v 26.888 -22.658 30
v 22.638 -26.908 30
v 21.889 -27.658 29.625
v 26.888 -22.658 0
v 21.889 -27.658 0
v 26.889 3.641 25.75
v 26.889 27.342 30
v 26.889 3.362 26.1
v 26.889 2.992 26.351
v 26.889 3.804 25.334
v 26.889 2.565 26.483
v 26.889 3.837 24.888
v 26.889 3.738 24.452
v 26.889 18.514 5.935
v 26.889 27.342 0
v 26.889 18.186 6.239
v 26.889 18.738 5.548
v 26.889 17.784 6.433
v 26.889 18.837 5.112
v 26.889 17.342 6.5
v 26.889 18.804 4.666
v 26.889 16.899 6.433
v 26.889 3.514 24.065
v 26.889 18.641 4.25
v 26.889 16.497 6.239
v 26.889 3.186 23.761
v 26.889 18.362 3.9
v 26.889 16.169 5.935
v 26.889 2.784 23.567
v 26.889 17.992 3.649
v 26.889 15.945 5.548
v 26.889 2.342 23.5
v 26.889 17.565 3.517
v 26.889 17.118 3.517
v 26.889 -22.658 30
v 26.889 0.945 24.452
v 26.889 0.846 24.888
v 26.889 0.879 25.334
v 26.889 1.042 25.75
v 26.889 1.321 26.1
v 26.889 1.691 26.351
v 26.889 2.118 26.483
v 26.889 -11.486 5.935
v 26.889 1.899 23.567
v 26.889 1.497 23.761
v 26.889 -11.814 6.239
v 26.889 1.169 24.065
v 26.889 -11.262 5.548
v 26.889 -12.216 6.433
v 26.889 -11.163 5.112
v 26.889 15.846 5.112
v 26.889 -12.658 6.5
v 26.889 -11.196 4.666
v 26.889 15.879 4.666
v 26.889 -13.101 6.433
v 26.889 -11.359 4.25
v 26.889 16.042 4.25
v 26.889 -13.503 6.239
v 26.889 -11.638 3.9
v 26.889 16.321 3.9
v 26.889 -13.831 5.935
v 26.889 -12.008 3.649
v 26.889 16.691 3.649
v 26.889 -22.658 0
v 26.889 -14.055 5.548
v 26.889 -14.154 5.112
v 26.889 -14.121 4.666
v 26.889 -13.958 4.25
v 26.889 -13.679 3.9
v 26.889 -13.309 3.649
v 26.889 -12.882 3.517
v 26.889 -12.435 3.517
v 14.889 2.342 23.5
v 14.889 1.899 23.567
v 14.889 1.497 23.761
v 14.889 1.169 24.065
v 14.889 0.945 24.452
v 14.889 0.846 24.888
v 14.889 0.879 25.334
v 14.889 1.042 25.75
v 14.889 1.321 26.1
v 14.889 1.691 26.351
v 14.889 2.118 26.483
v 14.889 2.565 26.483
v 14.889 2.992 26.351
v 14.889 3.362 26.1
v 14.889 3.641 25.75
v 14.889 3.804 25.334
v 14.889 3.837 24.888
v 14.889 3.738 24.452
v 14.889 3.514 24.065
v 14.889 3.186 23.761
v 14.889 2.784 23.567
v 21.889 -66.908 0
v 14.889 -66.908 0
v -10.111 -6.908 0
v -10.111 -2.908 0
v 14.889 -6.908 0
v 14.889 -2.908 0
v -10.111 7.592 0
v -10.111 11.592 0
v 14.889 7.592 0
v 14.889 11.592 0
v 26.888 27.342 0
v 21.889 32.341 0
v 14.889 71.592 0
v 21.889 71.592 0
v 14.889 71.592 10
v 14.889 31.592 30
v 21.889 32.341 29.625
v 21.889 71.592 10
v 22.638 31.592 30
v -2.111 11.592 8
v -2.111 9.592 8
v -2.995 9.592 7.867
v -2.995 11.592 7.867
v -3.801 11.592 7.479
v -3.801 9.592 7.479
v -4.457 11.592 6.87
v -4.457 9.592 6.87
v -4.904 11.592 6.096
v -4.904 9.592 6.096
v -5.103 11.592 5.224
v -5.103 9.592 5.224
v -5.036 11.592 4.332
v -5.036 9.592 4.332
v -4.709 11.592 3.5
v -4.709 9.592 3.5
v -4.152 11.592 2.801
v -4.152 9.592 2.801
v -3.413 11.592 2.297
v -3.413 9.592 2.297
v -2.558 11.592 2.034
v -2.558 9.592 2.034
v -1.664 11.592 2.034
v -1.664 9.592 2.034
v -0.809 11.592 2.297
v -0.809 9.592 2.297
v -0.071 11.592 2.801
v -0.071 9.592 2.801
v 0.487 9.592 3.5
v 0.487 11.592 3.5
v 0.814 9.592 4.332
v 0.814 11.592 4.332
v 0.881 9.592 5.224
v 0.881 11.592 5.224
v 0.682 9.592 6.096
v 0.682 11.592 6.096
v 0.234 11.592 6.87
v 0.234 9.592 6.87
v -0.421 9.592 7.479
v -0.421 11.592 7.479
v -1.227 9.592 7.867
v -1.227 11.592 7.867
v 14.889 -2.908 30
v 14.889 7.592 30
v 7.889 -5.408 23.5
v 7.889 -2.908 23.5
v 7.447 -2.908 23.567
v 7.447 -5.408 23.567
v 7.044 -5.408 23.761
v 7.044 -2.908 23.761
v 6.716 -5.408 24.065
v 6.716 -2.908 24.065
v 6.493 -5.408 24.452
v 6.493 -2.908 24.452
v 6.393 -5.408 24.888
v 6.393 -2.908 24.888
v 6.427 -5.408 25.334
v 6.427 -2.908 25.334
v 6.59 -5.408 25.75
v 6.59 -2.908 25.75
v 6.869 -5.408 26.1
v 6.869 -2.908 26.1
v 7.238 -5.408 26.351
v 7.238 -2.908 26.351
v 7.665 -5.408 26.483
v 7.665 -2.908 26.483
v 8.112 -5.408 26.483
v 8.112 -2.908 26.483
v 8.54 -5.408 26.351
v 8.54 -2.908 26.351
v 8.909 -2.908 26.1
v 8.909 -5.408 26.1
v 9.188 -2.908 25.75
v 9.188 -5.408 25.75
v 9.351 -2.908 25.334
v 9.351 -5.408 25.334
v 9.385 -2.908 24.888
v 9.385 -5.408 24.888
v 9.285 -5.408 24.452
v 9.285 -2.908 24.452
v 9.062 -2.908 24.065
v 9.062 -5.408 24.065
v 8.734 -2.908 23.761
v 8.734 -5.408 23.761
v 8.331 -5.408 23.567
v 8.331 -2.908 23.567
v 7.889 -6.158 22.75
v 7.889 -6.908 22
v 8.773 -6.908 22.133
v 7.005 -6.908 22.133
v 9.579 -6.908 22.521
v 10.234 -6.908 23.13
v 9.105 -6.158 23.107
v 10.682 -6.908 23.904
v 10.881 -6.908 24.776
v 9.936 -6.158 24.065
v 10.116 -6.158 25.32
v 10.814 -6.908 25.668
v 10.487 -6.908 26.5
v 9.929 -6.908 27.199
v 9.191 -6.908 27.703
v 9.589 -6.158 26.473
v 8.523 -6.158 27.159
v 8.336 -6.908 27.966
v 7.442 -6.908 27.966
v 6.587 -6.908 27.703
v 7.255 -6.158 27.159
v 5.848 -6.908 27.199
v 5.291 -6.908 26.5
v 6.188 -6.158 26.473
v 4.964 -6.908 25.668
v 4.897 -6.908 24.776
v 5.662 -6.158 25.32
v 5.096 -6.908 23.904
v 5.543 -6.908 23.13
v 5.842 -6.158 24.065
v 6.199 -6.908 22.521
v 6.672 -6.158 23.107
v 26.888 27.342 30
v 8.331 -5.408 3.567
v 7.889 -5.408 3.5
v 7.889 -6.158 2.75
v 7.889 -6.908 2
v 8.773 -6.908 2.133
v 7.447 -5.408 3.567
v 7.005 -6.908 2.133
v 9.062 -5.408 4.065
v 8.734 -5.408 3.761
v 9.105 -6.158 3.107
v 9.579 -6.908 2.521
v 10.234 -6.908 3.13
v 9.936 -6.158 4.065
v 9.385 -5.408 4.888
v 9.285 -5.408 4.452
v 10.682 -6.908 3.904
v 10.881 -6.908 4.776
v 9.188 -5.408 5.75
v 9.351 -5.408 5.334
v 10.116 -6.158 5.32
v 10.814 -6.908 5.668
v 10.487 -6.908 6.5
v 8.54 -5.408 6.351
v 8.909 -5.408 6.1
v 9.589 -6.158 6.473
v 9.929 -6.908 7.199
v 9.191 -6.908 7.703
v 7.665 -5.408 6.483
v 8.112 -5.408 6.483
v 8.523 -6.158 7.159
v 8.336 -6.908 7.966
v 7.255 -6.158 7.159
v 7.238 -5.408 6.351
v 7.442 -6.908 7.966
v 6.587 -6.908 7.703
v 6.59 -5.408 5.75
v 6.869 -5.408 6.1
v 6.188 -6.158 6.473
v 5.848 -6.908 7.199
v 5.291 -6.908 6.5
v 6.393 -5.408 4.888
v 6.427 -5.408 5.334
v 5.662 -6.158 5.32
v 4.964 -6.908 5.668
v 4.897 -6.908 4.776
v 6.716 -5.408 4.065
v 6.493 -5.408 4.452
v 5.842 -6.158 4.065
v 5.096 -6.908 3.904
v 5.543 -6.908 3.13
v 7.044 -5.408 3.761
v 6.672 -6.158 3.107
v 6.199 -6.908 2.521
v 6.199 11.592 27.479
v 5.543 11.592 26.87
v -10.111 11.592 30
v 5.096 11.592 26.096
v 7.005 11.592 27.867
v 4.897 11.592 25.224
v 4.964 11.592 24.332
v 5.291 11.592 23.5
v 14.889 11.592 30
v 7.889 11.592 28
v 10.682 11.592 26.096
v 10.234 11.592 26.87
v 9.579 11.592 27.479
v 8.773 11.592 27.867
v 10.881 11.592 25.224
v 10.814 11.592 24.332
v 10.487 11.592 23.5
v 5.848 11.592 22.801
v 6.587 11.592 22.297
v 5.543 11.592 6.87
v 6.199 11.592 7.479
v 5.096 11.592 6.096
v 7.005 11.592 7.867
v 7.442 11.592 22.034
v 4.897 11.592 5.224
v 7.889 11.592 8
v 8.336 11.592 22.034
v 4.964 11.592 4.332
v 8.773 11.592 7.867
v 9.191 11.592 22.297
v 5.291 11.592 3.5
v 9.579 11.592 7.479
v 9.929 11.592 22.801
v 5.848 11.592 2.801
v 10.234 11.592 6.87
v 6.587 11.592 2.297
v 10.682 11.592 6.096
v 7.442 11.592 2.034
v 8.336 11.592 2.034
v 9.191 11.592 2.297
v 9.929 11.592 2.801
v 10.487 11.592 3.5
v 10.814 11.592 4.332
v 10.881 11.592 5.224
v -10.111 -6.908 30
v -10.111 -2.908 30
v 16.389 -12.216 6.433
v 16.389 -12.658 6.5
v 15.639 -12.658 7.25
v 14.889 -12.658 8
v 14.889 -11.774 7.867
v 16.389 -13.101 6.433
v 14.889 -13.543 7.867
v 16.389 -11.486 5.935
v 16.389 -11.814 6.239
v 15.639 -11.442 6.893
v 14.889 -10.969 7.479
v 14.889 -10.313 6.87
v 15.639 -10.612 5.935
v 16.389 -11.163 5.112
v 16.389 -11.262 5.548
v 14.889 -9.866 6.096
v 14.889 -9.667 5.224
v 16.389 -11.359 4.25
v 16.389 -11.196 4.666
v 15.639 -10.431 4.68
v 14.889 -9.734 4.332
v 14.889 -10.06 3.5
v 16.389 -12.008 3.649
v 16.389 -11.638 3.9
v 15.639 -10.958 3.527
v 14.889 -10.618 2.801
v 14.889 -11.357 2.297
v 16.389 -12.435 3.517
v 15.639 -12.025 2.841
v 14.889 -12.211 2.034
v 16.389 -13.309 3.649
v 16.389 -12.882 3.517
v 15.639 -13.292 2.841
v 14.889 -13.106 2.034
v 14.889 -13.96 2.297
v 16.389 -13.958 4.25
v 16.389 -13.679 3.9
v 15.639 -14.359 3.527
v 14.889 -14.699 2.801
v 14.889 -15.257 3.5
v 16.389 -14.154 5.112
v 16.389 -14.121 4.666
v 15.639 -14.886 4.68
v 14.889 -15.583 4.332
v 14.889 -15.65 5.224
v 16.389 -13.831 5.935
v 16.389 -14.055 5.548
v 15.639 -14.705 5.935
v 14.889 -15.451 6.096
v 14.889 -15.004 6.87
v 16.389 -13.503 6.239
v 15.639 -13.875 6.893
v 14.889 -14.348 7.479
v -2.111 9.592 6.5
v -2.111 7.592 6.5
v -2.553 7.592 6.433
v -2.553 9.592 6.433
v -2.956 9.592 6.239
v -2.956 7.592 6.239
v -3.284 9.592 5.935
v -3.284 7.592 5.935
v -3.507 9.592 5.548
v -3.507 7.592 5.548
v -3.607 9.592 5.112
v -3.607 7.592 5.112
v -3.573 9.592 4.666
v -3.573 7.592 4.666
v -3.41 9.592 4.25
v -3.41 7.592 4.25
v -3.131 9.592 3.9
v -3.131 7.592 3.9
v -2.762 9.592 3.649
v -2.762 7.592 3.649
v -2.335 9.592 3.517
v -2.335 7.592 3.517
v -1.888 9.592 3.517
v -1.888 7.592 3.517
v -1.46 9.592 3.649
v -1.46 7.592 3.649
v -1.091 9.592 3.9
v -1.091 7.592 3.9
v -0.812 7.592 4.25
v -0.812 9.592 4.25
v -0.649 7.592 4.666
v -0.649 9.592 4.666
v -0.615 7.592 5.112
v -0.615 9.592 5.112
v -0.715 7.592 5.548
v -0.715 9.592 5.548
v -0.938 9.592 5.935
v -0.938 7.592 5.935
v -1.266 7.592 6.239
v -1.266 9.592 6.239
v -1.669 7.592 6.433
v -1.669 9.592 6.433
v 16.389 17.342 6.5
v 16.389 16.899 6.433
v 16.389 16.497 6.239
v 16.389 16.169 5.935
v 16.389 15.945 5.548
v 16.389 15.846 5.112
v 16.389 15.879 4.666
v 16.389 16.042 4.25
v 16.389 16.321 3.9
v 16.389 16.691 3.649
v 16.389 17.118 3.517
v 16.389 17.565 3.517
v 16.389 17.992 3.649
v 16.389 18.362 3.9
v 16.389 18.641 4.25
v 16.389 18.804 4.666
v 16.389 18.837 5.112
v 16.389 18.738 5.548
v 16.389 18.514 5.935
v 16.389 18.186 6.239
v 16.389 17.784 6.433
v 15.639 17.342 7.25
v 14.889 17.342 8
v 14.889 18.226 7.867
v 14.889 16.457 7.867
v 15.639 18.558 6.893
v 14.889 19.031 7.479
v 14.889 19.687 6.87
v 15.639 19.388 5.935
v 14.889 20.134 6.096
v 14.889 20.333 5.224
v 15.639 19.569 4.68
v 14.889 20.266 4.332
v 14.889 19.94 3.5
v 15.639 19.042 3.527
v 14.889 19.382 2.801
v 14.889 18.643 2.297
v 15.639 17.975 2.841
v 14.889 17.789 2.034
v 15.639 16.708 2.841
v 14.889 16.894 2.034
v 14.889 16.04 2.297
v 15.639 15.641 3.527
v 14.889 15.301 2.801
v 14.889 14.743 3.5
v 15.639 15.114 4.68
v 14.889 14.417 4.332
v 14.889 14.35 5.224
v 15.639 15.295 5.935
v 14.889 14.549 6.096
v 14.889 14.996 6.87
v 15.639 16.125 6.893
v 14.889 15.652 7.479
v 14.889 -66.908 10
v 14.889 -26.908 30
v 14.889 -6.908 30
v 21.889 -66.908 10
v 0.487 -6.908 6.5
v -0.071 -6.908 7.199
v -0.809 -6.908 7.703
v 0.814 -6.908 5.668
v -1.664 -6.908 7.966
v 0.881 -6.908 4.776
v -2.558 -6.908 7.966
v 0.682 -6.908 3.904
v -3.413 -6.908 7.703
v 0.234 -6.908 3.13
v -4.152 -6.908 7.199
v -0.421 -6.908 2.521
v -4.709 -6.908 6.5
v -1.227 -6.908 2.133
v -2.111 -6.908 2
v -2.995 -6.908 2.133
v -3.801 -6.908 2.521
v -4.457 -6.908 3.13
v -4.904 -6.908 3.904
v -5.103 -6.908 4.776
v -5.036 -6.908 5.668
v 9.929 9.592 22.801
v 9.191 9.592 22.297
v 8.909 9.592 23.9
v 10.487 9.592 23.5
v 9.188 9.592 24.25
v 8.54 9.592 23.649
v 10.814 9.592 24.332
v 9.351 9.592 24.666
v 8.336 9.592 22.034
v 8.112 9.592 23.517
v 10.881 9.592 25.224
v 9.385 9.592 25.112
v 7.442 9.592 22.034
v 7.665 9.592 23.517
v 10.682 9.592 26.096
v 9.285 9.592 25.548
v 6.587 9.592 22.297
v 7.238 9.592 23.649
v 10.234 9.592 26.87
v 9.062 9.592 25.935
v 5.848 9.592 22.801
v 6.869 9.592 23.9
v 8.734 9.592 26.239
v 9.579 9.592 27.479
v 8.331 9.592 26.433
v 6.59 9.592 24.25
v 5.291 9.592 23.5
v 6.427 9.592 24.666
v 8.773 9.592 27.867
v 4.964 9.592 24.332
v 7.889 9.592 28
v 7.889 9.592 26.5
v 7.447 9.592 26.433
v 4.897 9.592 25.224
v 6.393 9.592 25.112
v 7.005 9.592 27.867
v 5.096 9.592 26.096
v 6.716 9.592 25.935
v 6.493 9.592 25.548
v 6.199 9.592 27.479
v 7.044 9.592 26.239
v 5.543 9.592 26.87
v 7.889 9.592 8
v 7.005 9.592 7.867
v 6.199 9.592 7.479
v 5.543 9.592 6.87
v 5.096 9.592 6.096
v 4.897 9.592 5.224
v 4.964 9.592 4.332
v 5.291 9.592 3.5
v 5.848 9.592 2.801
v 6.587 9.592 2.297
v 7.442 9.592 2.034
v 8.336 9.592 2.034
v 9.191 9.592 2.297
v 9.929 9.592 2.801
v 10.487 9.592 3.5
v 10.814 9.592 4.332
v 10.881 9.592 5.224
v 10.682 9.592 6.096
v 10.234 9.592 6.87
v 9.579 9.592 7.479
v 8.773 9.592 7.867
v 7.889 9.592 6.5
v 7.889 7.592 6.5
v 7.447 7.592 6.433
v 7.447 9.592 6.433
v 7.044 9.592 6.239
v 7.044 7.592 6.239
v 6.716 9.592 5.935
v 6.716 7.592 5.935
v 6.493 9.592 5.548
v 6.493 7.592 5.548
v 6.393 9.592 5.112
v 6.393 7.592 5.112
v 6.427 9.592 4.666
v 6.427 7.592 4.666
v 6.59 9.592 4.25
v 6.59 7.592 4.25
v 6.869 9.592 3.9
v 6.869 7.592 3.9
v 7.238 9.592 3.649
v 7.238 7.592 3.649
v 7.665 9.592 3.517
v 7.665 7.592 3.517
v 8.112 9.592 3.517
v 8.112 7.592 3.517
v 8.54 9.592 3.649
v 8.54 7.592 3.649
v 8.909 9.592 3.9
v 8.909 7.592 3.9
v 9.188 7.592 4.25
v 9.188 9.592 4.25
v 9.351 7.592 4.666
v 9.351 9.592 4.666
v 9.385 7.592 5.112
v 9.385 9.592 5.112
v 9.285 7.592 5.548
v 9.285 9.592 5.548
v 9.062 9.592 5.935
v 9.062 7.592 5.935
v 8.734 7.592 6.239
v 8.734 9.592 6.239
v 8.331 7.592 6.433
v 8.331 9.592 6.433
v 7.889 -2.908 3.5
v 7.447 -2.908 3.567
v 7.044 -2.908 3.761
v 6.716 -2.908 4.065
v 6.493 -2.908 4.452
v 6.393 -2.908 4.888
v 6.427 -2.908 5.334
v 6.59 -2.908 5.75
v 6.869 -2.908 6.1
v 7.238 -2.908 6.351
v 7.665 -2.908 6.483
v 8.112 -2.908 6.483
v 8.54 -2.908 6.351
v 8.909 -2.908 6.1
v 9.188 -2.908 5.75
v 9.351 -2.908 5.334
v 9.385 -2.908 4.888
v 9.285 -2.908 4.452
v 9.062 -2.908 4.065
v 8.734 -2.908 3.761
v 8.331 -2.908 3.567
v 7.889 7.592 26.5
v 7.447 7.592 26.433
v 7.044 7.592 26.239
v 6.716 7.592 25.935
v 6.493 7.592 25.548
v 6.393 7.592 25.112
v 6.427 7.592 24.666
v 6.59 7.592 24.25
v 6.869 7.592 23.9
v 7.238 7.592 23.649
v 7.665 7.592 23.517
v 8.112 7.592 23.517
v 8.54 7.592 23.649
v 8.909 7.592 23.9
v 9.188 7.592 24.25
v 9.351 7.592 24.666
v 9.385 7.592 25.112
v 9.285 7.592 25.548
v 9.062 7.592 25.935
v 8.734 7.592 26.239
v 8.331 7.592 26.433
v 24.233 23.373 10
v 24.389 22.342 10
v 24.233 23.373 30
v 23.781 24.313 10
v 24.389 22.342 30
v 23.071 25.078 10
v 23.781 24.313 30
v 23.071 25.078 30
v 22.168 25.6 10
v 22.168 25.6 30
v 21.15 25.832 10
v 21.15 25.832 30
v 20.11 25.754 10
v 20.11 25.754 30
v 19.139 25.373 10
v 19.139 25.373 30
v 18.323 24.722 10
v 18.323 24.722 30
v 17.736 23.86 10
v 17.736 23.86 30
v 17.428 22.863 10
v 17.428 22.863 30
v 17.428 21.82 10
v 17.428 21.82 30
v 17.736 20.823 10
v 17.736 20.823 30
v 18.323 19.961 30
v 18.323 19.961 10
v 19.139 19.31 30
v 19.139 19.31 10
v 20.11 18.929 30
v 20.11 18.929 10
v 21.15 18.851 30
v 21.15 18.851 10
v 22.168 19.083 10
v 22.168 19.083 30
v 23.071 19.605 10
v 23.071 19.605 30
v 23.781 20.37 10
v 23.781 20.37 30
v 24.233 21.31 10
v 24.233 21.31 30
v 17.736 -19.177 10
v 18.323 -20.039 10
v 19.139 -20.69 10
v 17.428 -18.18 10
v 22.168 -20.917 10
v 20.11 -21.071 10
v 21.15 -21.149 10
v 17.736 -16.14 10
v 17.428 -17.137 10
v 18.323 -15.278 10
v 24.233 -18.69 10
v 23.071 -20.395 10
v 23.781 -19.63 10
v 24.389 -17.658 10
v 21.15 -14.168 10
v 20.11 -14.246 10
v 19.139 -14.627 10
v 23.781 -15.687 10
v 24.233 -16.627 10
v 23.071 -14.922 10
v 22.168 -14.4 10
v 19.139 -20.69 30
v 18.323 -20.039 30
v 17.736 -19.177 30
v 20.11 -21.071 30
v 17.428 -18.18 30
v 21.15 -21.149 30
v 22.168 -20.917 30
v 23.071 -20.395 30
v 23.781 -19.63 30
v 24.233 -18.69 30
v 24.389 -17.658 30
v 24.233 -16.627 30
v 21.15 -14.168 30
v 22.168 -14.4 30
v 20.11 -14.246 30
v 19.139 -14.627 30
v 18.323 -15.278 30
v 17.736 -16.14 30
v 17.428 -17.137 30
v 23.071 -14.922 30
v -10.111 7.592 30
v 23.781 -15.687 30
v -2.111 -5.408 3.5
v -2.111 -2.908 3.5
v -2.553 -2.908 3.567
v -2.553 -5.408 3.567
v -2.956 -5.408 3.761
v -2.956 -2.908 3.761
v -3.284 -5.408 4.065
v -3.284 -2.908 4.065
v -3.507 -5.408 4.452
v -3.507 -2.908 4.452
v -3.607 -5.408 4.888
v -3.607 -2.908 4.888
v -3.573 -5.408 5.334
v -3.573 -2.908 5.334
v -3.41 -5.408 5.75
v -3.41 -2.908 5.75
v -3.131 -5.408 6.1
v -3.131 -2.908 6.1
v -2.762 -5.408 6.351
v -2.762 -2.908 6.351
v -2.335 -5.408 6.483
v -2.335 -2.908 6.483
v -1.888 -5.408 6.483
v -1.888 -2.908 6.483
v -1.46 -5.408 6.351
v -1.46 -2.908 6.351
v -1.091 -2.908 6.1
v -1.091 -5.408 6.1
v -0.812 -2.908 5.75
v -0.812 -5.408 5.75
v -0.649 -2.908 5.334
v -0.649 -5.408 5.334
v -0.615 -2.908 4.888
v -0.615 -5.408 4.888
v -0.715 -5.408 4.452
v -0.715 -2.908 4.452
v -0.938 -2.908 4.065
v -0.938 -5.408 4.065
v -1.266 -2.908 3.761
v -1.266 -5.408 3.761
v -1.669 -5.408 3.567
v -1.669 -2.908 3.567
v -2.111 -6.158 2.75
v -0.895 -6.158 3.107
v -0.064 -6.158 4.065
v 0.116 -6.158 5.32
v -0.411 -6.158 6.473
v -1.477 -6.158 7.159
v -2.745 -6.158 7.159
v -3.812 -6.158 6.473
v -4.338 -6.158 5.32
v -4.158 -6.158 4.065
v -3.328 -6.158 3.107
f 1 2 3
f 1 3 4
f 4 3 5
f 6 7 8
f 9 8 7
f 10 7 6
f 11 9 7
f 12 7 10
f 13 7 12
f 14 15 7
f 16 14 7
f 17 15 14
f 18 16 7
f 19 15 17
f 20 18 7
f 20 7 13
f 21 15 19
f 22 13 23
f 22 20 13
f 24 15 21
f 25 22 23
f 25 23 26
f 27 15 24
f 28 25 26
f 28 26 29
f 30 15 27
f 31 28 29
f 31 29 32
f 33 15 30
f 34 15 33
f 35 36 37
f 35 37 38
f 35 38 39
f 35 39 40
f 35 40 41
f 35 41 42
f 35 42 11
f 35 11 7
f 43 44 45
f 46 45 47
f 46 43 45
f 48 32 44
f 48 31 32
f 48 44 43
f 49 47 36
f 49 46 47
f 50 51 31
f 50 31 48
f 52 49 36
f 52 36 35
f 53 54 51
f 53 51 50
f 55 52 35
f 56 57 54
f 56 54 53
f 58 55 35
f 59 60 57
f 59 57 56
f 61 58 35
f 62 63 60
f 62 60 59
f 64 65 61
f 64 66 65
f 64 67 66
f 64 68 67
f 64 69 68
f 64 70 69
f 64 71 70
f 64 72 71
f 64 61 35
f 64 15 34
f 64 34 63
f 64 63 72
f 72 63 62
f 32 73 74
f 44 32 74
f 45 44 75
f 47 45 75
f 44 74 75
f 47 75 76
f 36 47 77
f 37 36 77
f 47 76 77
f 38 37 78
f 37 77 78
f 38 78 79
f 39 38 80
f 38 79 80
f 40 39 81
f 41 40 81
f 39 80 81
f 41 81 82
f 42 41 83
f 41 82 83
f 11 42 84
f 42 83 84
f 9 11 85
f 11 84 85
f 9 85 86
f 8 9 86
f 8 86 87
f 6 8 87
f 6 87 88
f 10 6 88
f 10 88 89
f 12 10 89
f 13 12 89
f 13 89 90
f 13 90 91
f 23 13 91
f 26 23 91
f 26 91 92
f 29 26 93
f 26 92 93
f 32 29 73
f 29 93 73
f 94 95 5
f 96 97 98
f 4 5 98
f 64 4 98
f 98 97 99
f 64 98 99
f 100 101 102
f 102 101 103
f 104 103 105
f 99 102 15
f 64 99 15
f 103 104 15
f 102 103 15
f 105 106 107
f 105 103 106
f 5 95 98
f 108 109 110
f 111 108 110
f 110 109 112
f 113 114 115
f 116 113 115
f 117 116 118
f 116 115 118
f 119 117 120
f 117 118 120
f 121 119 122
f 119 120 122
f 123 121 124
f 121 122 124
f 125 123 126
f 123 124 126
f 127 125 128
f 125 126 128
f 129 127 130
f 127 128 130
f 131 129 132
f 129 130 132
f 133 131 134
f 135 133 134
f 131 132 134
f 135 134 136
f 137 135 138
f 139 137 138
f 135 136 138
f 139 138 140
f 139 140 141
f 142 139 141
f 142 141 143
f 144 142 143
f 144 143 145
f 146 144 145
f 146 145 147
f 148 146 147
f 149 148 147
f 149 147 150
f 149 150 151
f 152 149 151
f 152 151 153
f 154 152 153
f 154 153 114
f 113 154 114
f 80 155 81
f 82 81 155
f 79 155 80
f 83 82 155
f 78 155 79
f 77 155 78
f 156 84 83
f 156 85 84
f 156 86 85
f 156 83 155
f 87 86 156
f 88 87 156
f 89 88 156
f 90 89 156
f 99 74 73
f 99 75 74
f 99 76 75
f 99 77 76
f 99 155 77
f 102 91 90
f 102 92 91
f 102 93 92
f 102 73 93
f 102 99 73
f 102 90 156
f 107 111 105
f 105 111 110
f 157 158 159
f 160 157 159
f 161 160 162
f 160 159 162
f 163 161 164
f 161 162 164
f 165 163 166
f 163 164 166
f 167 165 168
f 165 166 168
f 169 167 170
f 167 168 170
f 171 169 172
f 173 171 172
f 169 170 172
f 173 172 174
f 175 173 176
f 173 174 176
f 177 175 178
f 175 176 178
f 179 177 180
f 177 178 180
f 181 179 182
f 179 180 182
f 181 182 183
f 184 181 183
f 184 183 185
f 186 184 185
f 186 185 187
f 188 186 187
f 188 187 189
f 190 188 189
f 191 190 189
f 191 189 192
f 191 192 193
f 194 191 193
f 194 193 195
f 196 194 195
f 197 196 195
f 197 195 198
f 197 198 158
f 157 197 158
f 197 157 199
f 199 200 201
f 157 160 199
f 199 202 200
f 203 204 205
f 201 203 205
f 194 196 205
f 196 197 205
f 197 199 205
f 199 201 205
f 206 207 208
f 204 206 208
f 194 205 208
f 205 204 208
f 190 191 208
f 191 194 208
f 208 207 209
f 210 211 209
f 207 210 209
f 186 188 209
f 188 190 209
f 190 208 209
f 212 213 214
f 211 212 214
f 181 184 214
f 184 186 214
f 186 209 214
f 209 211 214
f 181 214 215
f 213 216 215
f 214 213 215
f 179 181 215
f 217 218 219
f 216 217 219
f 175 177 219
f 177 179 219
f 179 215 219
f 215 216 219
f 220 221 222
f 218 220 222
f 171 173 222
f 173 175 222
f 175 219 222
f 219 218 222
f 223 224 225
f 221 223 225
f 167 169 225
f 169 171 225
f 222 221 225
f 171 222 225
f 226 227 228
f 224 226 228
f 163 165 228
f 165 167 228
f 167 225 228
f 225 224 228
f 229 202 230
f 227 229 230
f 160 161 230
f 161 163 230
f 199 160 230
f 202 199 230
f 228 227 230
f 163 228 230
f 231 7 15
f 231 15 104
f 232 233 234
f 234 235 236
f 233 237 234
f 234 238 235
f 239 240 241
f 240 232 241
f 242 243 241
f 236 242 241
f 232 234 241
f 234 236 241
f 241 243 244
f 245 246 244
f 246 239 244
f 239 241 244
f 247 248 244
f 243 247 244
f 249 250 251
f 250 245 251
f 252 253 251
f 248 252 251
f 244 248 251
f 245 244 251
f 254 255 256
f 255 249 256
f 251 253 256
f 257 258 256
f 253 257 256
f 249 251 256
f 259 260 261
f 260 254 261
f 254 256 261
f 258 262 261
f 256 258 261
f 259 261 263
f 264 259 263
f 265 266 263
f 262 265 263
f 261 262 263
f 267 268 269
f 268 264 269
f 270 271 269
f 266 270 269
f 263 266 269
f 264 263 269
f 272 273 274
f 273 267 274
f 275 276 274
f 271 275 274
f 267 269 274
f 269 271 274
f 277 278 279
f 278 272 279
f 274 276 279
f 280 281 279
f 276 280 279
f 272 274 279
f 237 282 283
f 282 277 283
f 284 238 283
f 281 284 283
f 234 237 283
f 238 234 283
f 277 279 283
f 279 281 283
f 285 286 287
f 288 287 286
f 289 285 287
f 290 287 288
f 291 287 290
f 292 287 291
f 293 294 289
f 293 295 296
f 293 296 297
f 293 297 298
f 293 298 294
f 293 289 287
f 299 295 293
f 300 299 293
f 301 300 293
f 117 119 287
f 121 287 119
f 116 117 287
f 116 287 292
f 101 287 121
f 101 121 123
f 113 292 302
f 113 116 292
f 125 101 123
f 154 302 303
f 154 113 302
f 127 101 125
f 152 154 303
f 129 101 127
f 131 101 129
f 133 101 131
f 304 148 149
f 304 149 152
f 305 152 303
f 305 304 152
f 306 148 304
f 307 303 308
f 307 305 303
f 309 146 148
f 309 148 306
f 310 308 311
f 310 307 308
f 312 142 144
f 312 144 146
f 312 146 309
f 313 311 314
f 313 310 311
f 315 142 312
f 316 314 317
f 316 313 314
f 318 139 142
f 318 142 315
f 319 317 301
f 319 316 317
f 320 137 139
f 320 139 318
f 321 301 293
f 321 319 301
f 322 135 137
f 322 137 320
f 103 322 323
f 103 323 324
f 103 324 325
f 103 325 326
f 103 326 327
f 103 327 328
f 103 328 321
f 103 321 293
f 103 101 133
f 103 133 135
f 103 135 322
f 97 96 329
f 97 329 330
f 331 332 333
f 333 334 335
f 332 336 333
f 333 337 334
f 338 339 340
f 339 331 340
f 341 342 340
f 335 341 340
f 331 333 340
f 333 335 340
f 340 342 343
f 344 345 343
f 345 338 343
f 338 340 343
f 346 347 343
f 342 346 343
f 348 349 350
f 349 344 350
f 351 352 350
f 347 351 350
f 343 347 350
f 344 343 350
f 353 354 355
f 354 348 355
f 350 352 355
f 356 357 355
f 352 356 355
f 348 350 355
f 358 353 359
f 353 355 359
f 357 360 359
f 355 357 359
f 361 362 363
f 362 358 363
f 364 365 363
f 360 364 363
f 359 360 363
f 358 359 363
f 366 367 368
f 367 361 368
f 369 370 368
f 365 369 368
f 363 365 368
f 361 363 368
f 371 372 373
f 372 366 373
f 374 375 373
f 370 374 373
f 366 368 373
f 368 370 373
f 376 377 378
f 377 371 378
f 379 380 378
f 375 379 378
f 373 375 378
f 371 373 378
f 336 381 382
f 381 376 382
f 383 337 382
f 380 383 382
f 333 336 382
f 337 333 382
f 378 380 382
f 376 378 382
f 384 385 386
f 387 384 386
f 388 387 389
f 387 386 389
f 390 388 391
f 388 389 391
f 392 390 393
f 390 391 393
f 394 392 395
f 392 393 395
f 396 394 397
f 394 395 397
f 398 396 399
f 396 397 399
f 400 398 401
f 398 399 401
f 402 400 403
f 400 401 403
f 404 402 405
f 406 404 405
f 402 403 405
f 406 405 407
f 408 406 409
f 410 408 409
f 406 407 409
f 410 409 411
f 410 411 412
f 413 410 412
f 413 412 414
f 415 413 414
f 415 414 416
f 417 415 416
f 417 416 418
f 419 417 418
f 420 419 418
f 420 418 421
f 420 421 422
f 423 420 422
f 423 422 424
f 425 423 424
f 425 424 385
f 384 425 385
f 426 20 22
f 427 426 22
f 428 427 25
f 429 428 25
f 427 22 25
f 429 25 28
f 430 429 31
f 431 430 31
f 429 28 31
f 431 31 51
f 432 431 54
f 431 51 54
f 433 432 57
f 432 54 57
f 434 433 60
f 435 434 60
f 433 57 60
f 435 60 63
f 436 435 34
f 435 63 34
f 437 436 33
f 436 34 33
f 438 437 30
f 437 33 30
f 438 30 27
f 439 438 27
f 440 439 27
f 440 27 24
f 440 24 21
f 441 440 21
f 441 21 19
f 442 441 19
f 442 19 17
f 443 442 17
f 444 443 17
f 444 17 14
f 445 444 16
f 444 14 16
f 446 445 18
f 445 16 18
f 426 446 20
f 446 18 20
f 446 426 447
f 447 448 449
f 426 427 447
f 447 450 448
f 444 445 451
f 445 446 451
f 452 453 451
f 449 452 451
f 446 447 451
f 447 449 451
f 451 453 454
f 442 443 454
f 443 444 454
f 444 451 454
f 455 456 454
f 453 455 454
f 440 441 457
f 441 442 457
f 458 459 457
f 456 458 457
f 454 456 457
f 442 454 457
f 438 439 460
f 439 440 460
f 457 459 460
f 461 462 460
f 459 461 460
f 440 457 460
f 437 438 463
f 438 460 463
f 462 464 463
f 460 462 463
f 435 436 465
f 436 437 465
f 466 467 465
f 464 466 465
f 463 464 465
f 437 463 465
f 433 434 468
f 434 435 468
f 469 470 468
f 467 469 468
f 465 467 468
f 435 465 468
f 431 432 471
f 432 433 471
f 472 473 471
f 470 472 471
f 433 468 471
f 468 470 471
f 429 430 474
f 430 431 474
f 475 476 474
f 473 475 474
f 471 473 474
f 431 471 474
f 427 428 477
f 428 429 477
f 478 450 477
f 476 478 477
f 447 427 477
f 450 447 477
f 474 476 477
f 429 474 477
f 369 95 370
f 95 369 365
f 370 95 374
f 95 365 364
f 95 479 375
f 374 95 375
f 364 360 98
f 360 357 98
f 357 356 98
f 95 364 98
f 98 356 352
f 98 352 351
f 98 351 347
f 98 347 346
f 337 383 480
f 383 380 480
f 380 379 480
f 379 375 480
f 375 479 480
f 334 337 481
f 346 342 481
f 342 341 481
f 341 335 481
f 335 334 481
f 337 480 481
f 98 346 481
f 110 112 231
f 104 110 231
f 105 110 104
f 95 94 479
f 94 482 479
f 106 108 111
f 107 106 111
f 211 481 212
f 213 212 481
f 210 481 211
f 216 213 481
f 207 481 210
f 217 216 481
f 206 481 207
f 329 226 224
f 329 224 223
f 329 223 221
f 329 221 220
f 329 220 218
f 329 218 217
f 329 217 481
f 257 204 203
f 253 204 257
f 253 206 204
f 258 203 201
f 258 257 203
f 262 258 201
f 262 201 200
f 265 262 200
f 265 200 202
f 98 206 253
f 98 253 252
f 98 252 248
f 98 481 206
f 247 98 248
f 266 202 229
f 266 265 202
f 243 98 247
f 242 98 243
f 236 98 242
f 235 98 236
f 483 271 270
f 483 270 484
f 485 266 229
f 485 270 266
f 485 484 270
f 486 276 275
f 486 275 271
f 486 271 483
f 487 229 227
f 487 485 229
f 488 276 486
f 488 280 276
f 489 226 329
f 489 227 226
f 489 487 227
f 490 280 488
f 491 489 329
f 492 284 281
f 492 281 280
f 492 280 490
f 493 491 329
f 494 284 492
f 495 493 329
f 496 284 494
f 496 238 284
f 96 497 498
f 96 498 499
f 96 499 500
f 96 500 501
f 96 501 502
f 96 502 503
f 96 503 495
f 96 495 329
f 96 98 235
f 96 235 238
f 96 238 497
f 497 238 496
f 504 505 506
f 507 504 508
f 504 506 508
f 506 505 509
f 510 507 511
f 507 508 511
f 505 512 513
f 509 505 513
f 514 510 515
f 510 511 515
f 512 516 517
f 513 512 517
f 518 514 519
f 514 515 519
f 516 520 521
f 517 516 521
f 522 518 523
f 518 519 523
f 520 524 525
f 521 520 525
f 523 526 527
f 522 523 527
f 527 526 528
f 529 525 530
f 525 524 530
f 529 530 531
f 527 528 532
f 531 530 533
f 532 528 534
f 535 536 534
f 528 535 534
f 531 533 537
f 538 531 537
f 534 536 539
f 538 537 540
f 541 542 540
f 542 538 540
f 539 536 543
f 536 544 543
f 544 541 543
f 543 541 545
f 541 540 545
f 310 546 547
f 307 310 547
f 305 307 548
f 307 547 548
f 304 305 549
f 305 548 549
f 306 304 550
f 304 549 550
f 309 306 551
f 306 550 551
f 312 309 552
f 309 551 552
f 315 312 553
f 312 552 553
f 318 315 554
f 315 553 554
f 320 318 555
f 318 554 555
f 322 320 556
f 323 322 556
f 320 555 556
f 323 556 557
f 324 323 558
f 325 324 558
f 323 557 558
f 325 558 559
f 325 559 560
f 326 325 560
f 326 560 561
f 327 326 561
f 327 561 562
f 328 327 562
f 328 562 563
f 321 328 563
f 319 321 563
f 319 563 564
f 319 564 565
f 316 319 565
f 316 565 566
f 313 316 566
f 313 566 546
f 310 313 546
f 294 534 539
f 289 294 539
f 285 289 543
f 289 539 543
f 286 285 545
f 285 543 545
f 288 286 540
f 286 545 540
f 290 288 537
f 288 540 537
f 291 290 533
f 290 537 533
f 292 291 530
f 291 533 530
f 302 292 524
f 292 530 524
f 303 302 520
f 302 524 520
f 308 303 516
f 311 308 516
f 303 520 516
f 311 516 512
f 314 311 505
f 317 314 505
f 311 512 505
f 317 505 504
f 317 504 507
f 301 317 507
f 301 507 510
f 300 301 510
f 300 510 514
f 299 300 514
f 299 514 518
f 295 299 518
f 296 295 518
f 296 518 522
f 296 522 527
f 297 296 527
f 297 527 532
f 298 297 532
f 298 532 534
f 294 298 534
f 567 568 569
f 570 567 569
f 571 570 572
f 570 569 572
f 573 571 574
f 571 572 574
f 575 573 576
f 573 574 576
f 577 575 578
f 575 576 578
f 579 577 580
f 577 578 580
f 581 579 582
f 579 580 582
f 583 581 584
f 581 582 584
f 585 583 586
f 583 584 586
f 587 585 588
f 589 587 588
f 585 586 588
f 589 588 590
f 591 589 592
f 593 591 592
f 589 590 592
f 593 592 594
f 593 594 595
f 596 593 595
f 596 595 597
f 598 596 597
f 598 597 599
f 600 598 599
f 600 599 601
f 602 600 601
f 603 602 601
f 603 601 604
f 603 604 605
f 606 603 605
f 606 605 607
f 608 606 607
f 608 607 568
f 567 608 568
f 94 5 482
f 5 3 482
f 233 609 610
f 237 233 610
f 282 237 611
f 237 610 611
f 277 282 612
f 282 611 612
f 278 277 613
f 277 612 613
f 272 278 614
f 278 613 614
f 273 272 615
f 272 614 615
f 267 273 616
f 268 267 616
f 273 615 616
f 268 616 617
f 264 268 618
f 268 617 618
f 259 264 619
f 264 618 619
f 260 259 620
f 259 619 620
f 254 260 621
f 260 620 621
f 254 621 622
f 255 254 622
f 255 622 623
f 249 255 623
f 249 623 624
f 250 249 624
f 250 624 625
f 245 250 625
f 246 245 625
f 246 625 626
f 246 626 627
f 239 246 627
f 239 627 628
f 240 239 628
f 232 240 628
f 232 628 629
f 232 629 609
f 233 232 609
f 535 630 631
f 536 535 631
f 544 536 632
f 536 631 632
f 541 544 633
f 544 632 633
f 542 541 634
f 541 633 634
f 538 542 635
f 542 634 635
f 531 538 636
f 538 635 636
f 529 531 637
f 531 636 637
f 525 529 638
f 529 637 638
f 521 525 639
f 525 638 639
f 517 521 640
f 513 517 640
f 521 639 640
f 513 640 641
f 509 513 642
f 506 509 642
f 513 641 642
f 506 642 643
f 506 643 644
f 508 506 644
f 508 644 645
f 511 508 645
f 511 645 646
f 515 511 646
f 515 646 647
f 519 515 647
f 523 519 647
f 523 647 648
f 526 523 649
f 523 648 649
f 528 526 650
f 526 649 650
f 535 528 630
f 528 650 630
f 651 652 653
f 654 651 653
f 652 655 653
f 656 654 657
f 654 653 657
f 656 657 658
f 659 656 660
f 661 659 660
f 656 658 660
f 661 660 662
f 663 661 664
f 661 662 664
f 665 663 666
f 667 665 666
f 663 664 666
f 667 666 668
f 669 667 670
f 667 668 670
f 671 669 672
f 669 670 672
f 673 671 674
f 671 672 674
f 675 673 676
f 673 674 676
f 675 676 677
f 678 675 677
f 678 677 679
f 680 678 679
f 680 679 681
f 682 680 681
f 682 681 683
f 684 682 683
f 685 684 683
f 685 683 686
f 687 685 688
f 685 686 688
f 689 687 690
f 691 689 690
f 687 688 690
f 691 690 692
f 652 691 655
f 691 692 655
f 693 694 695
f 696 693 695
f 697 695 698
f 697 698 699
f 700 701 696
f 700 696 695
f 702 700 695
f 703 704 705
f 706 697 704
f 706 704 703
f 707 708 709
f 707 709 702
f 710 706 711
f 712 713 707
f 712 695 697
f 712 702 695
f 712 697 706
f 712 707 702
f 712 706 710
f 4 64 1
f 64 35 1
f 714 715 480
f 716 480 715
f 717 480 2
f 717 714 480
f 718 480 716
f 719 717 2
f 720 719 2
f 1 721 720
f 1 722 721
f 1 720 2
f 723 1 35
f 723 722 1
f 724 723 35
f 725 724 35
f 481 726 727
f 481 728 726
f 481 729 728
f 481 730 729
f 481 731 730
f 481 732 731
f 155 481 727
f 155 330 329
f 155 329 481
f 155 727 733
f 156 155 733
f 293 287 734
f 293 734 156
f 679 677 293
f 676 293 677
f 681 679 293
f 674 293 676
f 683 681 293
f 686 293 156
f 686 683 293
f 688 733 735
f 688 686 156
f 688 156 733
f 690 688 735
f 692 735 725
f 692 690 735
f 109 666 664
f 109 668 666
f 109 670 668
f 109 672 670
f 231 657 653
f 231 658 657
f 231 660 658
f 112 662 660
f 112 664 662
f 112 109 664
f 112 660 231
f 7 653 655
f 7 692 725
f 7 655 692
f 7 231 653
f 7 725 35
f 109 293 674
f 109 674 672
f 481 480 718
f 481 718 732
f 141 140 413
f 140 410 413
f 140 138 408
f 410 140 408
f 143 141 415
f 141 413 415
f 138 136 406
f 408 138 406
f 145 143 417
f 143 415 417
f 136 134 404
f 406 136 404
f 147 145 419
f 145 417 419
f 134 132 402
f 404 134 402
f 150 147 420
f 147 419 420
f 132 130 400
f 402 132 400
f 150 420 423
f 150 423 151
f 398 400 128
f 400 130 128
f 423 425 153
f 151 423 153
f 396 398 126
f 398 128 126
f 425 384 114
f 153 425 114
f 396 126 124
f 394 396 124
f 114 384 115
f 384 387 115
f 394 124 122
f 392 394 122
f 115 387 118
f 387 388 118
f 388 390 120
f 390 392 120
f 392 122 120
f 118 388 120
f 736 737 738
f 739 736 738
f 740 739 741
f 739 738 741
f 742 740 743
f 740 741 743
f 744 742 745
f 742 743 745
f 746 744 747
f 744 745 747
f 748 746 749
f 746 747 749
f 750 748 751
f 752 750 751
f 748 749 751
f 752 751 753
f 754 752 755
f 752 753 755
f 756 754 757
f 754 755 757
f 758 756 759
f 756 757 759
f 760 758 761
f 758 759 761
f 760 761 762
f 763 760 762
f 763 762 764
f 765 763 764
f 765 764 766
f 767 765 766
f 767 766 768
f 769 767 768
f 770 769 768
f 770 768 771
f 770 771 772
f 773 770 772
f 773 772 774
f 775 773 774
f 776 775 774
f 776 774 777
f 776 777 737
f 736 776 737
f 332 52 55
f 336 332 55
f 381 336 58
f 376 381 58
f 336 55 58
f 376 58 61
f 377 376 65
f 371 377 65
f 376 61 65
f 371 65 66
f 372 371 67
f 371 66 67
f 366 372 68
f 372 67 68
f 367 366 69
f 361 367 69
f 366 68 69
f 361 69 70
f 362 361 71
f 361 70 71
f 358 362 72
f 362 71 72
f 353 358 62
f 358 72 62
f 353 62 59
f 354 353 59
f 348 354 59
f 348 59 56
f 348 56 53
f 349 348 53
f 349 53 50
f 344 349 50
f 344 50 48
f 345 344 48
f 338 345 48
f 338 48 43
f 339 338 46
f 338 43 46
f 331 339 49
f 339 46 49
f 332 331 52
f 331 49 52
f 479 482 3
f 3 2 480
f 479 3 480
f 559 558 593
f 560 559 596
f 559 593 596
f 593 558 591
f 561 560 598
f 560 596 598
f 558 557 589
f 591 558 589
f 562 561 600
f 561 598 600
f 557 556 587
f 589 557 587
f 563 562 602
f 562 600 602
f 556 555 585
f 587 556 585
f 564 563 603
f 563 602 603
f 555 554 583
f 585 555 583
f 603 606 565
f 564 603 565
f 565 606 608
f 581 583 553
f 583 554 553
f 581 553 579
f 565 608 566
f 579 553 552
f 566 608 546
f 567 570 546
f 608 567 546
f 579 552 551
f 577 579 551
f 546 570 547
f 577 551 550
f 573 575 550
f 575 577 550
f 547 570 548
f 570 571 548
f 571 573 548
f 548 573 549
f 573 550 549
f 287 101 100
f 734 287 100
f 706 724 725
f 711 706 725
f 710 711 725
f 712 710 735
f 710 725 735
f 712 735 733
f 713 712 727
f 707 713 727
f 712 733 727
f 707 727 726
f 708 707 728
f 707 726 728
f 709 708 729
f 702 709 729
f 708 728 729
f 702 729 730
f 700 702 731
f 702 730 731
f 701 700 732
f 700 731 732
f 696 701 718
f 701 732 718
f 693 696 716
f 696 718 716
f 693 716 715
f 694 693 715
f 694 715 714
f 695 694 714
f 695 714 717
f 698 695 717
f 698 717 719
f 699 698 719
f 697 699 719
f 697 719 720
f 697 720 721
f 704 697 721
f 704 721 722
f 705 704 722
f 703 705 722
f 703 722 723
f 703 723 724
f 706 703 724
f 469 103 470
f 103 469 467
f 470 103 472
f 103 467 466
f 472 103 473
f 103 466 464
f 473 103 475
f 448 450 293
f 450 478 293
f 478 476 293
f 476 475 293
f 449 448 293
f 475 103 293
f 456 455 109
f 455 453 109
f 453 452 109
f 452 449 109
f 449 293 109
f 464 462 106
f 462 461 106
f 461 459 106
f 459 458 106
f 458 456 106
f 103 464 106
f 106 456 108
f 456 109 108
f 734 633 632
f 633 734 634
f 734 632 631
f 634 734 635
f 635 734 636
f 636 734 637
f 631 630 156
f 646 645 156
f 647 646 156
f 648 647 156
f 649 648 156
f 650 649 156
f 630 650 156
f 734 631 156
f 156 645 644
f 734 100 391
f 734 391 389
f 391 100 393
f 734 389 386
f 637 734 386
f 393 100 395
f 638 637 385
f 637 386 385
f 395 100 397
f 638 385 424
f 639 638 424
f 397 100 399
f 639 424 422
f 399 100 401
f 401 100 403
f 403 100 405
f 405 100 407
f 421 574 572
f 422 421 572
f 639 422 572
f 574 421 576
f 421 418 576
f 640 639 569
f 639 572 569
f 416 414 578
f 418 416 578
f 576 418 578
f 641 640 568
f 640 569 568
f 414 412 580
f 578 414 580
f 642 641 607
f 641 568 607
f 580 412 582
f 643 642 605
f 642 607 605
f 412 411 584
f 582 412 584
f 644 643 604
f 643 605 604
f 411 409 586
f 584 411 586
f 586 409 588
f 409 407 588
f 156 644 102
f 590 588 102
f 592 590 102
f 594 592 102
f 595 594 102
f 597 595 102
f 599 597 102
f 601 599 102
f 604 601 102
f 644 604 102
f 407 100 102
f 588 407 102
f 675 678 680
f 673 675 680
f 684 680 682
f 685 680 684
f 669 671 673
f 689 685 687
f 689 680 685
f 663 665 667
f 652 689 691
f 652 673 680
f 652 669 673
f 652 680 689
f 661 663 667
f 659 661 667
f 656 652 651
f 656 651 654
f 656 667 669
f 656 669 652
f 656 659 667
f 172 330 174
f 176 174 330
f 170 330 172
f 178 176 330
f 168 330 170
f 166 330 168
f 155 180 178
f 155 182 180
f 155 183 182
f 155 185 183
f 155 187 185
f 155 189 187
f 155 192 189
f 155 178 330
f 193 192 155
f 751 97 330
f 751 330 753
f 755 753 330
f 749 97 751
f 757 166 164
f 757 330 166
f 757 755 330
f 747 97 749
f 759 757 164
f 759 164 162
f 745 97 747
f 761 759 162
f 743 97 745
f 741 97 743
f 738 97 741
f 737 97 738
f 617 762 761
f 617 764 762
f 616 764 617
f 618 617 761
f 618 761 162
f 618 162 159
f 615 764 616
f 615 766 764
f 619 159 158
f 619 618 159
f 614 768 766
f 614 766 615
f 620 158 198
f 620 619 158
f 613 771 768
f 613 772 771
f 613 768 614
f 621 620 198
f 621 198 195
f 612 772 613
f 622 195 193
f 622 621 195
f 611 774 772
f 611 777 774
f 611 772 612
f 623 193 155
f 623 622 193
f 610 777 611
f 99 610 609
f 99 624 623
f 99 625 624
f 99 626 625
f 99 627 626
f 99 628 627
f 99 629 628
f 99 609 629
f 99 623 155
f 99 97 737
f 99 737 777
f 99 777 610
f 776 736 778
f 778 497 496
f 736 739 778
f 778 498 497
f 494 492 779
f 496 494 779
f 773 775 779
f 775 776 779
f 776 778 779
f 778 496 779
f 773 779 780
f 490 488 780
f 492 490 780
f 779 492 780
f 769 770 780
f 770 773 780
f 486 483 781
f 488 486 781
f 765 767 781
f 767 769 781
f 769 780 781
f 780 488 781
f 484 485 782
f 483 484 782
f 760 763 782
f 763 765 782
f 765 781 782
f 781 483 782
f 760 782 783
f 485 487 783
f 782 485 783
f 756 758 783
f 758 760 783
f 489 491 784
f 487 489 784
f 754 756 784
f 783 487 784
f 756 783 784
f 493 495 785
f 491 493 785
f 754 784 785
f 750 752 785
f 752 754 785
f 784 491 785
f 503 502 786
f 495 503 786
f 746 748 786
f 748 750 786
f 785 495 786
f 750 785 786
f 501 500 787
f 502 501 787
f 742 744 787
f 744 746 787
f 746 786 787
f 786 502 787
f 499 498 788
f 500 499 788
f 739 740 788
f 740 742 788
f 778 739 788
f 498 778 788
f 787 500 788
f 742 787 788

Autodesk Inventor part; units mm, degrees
ref_plane "YZ Plane" through (0, 0, 0) normal (1, 0, 0) x (0, 1, 0)
ref_plane "XZ Plane" through (0, 0, 0) normal (0, 1, 0) x (-1, 0, 0)
ref_plane "XY Plane" through (0, 0, 0) normal (0, 0, 1) x (1, 0, 0)
sketch "Sketch1" plane through (0, 0, 0) normal (0, 0, 1) x (1, 0, 0)
  line L0 (14.8889, 11.5915) -> (26.8889, 11.5915)
  line L1 (26.8889, 11.5915) -> (26.8889, -6.9085)
  line L2 (26.8889, -6.9085) -> (14.8889, -6.9085)
  line L3 (14.8889, -6.9085) -> (14.8889, 11.5915)
  line L4 (14.8889, 11.5915) -> (-10.1111, 11.5915)
  line L5 (-10.1111, 11.5915) -> (-10.1111, 7.5915)
  line L6 (-10.1111, 7.5915) -> (14.8889, 7.5915)
  line L7 (14.8889, 7.5915) -> (14.8889, 11.5915)
  line L8 (14.8889, -6.9085) -> (-10.1111, -6.9085)
  line L9 (-10.1111, -6.9085) -> (-10.1111, -2.9085)
  line L10 (-10.1111, -2.9085) -> (14.8889, -2.9085)
  line L11 (14.8889, -2.9085) -> (14.8889, -6.9085)
  point P0 (0, 0)
  dimension "d0" = 10.5
  dimension "d1" = 4
  dimension "d2" = 4
  dimension "d3" = 12
  dimension "d4" = 25
extrude "Extrusion1" add sketch "Sketch1" along normal blind 30
sketch "Sketch2" plane through (-10.1111, -6.9085, 0) normal (0, -1, 0) x (1, 0, 0)
  line L0 (0, 30) -> (37, 30) projected
  line L1 (0, 0) -> (37, 0) projected
  line L2 (25, 0) -> (25, 30) projected
  point P0 (10.1111, 0)
  point P1 (18, 25)
  point P2 (18, 5)
  point P3 (8, 5)
  dimension "d7" = 5
  dimension "d8" = 5
  dimension "d9" = 5
  dimension "d10" = 10
  dimension "d11" = 0
  dimension "d12" = 7
hole "Hole1" at (7.8889, -6.9085, 25) at (7.8889, -6.9085, 5) at (-2.1111, -6.9085, 5) direction (0, 1, 0) diameter 3 depth 8 tip angle 118 countersink diameter 6 countersink angle 90
sketch "Sketch3" plane through (-10.1111, 11.5915, 0) normal (0, 1, 0) x (1, 0, 0)
  circle A0 centre (18, -25) radius 1.5 projected
  circle A1 centre (18, -5) radius 1.5 projected
  circle A2 centre (8, -5) radius 1.5 projected
  point P0 (10.1111, 0)
hole "Hole2" at (7.8889, 11.5915, 25) at (7.8889, 11.5915, 5) at (-2.1111, 11.5915, 5) direction (0, -1, 0) diameter 3 depth 8 tip angle 118 counterbore diameter 6 counterbore depth 2
chamfer "Chamfer1" distance 5 angle 45 1 edges at (26.8889, 2.3415, 0)
sketch "Sketch4" plane through (0, 0, 30) normal (0, 0, 1) x (1, 0, 0)
  line L0 (21.8889, 11.5915) -> (14.8889, 11.5915)
  line L1 (14.8889, 11.5915) -> (14.8889, 71.5915)
  line L2 (14.8889, 71.5915) -> (21.8889, 71.5915)
  line L3 (21.8889, 71.5915) -> (21.8889, 11.5915)
  line L4 (-10.1111, -6.9085) -> (21.8889, -6.9085) projected
  line L5 (14.8889, -6.9085) -> (21.8889, -6.9085)
  line L6 (21.8889, -6.9085) -> (21.8889, -66.9085)
  line L7 (21.8889, -66.9085) -> (14.8889, -66.9085)
  line L8 (14.8889, -66.9085) -> (14.8889, -6.9085)
  line L9 (14.8889, 7.5915) -> (14.8889, -2.9085) projected
  point P0 (0, 0)
  dimension "d30" = 60
  dimension "d31" = 60
extrude "Extrusion2" add sketch "Sketch4" against normal blind 30
sketch "Sketch5" plane through (0, 0, 30) normal (0, 0, 1) x (1, 0, 0)
  line L0 (14.8889, 7.5915) -> (14.8889, -2.9085) projected
  line L1 (14.8889, 2.3415) -> (26.8889, 2.3415)
  line L2 (26.8889, 2.3415) -> (26.8889, 27.3415)
  line L3 (26.8889, 27.3415) -> (14.8889, 27.3415)
  line L4 (14.8889, 27.3415) -> (14.8889, 2.3415)
  line L5 (14.8889, 2.3415) -> (26.8889, 2.3415)
  line L6 (26.8889, 2.3415) -> (26.8889, -22.6585)
  line L7 (26.8889, -22.6585) -> (14.8889, -22.6585)
  line L8 (14.8889, -22.6585) -> (14.8889, 2.3415)
  line L9 (26.8889, -6.9085) -> (26.8889, 11.5915) projected
  point P0 (0, 0)
  dimension "d34" = 25
  dimension "d35" = 25
extrude "Extrusion3" add sketch "Sketch5" against normal blind 30
sketch "Sketch6" plane through (0, 0, 30) normal (0, 0, 1) x (1, 0, 0)
  line L0 (26.8889, -22.6585) -> (26.8889, 27.3415) projected
  line L1 (26.8889, 27.3415) -> (21.8889, 27.3415) projected
  circle A0 centre (20.8889, 22.3415) radius 3.5
  circle A1 centre (20.8889, -17.6585) radius 3.5
  point P0 (0, 0)
  dimension "d38" = 40
  dimension "d39" = 6
  dimension "d40" = 6
  dimension "d41" = 5
  dimension "d42" = 7
  dimension "d43" = 7
extrude "Extrusion4" cut sketch "Sketch6" against normal blind 20
chamfer "Chamfer2" distance 5 angle 45 2 edges at (21.8889, -22.6585, 15) (21.8889, 27.3415, 15)
chamfer "Chamfer3" distance 20 distance2 40 1 edges at (18.3889, -66.9085, 30) measured on face at (19.5556, -66.9085, 20)
chamfer "Chamfer4" distance 20 distance2 40 1 edges at (18.3889, 71.5915, 30) measured on face at (17.2222, 71.5915, 20)
sketch "Sketch7" plane through (26.8889, -22.6585, 30) normal (1, 0, 0) x (0, 0, -1)
  point P0 (30, 22.6585)
sketch "Sketch8" plane through (14.8889, -66.9085, 0) normal (-1, 0, 0) x (0, 0, 1)
  line L0 (0, 94.25) -> (0, 44.25) projected
  line L1 (0, 74.5) -> (0, 64) projected
  point P0 (0, 66.9085)
  point P1 (5, 84.25)
  point P2 (5, 54.25)
  point P3 (0, 69.25)
  dimension "d55" = 30
  dimension "d56" = 5
  dimension "d57" = 5
  dimension "d58" = 15
hole "Hole3" at (14.8889, -12.6585, 5) at (14.8889, 17.3415, 5) direction (1, 0, 0) diameter 3 depth 20 tip angle 118 countersink diameter 6 countersink angle 90
sketch "Sketch9" plane through (14.8889, 11.5915, 0) normal (-1, 0, 0) x (0, 0, 1)
  point P0 (0, -11.5915)
sketch "Sketch10" plane through (26.8889, -22.6585, 30) normal (1, 0, 0) x (0, 0, -1)
  line L0 (0, 30.25) -> (0, 19.75) projected
  point P0 (30, 22.6585)
  point P1 (5, 25)
  dimension "d66" = 5
hole "Hole4" at (26.8889, 2.3415, 25) direction (-1, 0, 0) diameter 3 depth 20 tip angle 118
properties part number "Col support beam"
